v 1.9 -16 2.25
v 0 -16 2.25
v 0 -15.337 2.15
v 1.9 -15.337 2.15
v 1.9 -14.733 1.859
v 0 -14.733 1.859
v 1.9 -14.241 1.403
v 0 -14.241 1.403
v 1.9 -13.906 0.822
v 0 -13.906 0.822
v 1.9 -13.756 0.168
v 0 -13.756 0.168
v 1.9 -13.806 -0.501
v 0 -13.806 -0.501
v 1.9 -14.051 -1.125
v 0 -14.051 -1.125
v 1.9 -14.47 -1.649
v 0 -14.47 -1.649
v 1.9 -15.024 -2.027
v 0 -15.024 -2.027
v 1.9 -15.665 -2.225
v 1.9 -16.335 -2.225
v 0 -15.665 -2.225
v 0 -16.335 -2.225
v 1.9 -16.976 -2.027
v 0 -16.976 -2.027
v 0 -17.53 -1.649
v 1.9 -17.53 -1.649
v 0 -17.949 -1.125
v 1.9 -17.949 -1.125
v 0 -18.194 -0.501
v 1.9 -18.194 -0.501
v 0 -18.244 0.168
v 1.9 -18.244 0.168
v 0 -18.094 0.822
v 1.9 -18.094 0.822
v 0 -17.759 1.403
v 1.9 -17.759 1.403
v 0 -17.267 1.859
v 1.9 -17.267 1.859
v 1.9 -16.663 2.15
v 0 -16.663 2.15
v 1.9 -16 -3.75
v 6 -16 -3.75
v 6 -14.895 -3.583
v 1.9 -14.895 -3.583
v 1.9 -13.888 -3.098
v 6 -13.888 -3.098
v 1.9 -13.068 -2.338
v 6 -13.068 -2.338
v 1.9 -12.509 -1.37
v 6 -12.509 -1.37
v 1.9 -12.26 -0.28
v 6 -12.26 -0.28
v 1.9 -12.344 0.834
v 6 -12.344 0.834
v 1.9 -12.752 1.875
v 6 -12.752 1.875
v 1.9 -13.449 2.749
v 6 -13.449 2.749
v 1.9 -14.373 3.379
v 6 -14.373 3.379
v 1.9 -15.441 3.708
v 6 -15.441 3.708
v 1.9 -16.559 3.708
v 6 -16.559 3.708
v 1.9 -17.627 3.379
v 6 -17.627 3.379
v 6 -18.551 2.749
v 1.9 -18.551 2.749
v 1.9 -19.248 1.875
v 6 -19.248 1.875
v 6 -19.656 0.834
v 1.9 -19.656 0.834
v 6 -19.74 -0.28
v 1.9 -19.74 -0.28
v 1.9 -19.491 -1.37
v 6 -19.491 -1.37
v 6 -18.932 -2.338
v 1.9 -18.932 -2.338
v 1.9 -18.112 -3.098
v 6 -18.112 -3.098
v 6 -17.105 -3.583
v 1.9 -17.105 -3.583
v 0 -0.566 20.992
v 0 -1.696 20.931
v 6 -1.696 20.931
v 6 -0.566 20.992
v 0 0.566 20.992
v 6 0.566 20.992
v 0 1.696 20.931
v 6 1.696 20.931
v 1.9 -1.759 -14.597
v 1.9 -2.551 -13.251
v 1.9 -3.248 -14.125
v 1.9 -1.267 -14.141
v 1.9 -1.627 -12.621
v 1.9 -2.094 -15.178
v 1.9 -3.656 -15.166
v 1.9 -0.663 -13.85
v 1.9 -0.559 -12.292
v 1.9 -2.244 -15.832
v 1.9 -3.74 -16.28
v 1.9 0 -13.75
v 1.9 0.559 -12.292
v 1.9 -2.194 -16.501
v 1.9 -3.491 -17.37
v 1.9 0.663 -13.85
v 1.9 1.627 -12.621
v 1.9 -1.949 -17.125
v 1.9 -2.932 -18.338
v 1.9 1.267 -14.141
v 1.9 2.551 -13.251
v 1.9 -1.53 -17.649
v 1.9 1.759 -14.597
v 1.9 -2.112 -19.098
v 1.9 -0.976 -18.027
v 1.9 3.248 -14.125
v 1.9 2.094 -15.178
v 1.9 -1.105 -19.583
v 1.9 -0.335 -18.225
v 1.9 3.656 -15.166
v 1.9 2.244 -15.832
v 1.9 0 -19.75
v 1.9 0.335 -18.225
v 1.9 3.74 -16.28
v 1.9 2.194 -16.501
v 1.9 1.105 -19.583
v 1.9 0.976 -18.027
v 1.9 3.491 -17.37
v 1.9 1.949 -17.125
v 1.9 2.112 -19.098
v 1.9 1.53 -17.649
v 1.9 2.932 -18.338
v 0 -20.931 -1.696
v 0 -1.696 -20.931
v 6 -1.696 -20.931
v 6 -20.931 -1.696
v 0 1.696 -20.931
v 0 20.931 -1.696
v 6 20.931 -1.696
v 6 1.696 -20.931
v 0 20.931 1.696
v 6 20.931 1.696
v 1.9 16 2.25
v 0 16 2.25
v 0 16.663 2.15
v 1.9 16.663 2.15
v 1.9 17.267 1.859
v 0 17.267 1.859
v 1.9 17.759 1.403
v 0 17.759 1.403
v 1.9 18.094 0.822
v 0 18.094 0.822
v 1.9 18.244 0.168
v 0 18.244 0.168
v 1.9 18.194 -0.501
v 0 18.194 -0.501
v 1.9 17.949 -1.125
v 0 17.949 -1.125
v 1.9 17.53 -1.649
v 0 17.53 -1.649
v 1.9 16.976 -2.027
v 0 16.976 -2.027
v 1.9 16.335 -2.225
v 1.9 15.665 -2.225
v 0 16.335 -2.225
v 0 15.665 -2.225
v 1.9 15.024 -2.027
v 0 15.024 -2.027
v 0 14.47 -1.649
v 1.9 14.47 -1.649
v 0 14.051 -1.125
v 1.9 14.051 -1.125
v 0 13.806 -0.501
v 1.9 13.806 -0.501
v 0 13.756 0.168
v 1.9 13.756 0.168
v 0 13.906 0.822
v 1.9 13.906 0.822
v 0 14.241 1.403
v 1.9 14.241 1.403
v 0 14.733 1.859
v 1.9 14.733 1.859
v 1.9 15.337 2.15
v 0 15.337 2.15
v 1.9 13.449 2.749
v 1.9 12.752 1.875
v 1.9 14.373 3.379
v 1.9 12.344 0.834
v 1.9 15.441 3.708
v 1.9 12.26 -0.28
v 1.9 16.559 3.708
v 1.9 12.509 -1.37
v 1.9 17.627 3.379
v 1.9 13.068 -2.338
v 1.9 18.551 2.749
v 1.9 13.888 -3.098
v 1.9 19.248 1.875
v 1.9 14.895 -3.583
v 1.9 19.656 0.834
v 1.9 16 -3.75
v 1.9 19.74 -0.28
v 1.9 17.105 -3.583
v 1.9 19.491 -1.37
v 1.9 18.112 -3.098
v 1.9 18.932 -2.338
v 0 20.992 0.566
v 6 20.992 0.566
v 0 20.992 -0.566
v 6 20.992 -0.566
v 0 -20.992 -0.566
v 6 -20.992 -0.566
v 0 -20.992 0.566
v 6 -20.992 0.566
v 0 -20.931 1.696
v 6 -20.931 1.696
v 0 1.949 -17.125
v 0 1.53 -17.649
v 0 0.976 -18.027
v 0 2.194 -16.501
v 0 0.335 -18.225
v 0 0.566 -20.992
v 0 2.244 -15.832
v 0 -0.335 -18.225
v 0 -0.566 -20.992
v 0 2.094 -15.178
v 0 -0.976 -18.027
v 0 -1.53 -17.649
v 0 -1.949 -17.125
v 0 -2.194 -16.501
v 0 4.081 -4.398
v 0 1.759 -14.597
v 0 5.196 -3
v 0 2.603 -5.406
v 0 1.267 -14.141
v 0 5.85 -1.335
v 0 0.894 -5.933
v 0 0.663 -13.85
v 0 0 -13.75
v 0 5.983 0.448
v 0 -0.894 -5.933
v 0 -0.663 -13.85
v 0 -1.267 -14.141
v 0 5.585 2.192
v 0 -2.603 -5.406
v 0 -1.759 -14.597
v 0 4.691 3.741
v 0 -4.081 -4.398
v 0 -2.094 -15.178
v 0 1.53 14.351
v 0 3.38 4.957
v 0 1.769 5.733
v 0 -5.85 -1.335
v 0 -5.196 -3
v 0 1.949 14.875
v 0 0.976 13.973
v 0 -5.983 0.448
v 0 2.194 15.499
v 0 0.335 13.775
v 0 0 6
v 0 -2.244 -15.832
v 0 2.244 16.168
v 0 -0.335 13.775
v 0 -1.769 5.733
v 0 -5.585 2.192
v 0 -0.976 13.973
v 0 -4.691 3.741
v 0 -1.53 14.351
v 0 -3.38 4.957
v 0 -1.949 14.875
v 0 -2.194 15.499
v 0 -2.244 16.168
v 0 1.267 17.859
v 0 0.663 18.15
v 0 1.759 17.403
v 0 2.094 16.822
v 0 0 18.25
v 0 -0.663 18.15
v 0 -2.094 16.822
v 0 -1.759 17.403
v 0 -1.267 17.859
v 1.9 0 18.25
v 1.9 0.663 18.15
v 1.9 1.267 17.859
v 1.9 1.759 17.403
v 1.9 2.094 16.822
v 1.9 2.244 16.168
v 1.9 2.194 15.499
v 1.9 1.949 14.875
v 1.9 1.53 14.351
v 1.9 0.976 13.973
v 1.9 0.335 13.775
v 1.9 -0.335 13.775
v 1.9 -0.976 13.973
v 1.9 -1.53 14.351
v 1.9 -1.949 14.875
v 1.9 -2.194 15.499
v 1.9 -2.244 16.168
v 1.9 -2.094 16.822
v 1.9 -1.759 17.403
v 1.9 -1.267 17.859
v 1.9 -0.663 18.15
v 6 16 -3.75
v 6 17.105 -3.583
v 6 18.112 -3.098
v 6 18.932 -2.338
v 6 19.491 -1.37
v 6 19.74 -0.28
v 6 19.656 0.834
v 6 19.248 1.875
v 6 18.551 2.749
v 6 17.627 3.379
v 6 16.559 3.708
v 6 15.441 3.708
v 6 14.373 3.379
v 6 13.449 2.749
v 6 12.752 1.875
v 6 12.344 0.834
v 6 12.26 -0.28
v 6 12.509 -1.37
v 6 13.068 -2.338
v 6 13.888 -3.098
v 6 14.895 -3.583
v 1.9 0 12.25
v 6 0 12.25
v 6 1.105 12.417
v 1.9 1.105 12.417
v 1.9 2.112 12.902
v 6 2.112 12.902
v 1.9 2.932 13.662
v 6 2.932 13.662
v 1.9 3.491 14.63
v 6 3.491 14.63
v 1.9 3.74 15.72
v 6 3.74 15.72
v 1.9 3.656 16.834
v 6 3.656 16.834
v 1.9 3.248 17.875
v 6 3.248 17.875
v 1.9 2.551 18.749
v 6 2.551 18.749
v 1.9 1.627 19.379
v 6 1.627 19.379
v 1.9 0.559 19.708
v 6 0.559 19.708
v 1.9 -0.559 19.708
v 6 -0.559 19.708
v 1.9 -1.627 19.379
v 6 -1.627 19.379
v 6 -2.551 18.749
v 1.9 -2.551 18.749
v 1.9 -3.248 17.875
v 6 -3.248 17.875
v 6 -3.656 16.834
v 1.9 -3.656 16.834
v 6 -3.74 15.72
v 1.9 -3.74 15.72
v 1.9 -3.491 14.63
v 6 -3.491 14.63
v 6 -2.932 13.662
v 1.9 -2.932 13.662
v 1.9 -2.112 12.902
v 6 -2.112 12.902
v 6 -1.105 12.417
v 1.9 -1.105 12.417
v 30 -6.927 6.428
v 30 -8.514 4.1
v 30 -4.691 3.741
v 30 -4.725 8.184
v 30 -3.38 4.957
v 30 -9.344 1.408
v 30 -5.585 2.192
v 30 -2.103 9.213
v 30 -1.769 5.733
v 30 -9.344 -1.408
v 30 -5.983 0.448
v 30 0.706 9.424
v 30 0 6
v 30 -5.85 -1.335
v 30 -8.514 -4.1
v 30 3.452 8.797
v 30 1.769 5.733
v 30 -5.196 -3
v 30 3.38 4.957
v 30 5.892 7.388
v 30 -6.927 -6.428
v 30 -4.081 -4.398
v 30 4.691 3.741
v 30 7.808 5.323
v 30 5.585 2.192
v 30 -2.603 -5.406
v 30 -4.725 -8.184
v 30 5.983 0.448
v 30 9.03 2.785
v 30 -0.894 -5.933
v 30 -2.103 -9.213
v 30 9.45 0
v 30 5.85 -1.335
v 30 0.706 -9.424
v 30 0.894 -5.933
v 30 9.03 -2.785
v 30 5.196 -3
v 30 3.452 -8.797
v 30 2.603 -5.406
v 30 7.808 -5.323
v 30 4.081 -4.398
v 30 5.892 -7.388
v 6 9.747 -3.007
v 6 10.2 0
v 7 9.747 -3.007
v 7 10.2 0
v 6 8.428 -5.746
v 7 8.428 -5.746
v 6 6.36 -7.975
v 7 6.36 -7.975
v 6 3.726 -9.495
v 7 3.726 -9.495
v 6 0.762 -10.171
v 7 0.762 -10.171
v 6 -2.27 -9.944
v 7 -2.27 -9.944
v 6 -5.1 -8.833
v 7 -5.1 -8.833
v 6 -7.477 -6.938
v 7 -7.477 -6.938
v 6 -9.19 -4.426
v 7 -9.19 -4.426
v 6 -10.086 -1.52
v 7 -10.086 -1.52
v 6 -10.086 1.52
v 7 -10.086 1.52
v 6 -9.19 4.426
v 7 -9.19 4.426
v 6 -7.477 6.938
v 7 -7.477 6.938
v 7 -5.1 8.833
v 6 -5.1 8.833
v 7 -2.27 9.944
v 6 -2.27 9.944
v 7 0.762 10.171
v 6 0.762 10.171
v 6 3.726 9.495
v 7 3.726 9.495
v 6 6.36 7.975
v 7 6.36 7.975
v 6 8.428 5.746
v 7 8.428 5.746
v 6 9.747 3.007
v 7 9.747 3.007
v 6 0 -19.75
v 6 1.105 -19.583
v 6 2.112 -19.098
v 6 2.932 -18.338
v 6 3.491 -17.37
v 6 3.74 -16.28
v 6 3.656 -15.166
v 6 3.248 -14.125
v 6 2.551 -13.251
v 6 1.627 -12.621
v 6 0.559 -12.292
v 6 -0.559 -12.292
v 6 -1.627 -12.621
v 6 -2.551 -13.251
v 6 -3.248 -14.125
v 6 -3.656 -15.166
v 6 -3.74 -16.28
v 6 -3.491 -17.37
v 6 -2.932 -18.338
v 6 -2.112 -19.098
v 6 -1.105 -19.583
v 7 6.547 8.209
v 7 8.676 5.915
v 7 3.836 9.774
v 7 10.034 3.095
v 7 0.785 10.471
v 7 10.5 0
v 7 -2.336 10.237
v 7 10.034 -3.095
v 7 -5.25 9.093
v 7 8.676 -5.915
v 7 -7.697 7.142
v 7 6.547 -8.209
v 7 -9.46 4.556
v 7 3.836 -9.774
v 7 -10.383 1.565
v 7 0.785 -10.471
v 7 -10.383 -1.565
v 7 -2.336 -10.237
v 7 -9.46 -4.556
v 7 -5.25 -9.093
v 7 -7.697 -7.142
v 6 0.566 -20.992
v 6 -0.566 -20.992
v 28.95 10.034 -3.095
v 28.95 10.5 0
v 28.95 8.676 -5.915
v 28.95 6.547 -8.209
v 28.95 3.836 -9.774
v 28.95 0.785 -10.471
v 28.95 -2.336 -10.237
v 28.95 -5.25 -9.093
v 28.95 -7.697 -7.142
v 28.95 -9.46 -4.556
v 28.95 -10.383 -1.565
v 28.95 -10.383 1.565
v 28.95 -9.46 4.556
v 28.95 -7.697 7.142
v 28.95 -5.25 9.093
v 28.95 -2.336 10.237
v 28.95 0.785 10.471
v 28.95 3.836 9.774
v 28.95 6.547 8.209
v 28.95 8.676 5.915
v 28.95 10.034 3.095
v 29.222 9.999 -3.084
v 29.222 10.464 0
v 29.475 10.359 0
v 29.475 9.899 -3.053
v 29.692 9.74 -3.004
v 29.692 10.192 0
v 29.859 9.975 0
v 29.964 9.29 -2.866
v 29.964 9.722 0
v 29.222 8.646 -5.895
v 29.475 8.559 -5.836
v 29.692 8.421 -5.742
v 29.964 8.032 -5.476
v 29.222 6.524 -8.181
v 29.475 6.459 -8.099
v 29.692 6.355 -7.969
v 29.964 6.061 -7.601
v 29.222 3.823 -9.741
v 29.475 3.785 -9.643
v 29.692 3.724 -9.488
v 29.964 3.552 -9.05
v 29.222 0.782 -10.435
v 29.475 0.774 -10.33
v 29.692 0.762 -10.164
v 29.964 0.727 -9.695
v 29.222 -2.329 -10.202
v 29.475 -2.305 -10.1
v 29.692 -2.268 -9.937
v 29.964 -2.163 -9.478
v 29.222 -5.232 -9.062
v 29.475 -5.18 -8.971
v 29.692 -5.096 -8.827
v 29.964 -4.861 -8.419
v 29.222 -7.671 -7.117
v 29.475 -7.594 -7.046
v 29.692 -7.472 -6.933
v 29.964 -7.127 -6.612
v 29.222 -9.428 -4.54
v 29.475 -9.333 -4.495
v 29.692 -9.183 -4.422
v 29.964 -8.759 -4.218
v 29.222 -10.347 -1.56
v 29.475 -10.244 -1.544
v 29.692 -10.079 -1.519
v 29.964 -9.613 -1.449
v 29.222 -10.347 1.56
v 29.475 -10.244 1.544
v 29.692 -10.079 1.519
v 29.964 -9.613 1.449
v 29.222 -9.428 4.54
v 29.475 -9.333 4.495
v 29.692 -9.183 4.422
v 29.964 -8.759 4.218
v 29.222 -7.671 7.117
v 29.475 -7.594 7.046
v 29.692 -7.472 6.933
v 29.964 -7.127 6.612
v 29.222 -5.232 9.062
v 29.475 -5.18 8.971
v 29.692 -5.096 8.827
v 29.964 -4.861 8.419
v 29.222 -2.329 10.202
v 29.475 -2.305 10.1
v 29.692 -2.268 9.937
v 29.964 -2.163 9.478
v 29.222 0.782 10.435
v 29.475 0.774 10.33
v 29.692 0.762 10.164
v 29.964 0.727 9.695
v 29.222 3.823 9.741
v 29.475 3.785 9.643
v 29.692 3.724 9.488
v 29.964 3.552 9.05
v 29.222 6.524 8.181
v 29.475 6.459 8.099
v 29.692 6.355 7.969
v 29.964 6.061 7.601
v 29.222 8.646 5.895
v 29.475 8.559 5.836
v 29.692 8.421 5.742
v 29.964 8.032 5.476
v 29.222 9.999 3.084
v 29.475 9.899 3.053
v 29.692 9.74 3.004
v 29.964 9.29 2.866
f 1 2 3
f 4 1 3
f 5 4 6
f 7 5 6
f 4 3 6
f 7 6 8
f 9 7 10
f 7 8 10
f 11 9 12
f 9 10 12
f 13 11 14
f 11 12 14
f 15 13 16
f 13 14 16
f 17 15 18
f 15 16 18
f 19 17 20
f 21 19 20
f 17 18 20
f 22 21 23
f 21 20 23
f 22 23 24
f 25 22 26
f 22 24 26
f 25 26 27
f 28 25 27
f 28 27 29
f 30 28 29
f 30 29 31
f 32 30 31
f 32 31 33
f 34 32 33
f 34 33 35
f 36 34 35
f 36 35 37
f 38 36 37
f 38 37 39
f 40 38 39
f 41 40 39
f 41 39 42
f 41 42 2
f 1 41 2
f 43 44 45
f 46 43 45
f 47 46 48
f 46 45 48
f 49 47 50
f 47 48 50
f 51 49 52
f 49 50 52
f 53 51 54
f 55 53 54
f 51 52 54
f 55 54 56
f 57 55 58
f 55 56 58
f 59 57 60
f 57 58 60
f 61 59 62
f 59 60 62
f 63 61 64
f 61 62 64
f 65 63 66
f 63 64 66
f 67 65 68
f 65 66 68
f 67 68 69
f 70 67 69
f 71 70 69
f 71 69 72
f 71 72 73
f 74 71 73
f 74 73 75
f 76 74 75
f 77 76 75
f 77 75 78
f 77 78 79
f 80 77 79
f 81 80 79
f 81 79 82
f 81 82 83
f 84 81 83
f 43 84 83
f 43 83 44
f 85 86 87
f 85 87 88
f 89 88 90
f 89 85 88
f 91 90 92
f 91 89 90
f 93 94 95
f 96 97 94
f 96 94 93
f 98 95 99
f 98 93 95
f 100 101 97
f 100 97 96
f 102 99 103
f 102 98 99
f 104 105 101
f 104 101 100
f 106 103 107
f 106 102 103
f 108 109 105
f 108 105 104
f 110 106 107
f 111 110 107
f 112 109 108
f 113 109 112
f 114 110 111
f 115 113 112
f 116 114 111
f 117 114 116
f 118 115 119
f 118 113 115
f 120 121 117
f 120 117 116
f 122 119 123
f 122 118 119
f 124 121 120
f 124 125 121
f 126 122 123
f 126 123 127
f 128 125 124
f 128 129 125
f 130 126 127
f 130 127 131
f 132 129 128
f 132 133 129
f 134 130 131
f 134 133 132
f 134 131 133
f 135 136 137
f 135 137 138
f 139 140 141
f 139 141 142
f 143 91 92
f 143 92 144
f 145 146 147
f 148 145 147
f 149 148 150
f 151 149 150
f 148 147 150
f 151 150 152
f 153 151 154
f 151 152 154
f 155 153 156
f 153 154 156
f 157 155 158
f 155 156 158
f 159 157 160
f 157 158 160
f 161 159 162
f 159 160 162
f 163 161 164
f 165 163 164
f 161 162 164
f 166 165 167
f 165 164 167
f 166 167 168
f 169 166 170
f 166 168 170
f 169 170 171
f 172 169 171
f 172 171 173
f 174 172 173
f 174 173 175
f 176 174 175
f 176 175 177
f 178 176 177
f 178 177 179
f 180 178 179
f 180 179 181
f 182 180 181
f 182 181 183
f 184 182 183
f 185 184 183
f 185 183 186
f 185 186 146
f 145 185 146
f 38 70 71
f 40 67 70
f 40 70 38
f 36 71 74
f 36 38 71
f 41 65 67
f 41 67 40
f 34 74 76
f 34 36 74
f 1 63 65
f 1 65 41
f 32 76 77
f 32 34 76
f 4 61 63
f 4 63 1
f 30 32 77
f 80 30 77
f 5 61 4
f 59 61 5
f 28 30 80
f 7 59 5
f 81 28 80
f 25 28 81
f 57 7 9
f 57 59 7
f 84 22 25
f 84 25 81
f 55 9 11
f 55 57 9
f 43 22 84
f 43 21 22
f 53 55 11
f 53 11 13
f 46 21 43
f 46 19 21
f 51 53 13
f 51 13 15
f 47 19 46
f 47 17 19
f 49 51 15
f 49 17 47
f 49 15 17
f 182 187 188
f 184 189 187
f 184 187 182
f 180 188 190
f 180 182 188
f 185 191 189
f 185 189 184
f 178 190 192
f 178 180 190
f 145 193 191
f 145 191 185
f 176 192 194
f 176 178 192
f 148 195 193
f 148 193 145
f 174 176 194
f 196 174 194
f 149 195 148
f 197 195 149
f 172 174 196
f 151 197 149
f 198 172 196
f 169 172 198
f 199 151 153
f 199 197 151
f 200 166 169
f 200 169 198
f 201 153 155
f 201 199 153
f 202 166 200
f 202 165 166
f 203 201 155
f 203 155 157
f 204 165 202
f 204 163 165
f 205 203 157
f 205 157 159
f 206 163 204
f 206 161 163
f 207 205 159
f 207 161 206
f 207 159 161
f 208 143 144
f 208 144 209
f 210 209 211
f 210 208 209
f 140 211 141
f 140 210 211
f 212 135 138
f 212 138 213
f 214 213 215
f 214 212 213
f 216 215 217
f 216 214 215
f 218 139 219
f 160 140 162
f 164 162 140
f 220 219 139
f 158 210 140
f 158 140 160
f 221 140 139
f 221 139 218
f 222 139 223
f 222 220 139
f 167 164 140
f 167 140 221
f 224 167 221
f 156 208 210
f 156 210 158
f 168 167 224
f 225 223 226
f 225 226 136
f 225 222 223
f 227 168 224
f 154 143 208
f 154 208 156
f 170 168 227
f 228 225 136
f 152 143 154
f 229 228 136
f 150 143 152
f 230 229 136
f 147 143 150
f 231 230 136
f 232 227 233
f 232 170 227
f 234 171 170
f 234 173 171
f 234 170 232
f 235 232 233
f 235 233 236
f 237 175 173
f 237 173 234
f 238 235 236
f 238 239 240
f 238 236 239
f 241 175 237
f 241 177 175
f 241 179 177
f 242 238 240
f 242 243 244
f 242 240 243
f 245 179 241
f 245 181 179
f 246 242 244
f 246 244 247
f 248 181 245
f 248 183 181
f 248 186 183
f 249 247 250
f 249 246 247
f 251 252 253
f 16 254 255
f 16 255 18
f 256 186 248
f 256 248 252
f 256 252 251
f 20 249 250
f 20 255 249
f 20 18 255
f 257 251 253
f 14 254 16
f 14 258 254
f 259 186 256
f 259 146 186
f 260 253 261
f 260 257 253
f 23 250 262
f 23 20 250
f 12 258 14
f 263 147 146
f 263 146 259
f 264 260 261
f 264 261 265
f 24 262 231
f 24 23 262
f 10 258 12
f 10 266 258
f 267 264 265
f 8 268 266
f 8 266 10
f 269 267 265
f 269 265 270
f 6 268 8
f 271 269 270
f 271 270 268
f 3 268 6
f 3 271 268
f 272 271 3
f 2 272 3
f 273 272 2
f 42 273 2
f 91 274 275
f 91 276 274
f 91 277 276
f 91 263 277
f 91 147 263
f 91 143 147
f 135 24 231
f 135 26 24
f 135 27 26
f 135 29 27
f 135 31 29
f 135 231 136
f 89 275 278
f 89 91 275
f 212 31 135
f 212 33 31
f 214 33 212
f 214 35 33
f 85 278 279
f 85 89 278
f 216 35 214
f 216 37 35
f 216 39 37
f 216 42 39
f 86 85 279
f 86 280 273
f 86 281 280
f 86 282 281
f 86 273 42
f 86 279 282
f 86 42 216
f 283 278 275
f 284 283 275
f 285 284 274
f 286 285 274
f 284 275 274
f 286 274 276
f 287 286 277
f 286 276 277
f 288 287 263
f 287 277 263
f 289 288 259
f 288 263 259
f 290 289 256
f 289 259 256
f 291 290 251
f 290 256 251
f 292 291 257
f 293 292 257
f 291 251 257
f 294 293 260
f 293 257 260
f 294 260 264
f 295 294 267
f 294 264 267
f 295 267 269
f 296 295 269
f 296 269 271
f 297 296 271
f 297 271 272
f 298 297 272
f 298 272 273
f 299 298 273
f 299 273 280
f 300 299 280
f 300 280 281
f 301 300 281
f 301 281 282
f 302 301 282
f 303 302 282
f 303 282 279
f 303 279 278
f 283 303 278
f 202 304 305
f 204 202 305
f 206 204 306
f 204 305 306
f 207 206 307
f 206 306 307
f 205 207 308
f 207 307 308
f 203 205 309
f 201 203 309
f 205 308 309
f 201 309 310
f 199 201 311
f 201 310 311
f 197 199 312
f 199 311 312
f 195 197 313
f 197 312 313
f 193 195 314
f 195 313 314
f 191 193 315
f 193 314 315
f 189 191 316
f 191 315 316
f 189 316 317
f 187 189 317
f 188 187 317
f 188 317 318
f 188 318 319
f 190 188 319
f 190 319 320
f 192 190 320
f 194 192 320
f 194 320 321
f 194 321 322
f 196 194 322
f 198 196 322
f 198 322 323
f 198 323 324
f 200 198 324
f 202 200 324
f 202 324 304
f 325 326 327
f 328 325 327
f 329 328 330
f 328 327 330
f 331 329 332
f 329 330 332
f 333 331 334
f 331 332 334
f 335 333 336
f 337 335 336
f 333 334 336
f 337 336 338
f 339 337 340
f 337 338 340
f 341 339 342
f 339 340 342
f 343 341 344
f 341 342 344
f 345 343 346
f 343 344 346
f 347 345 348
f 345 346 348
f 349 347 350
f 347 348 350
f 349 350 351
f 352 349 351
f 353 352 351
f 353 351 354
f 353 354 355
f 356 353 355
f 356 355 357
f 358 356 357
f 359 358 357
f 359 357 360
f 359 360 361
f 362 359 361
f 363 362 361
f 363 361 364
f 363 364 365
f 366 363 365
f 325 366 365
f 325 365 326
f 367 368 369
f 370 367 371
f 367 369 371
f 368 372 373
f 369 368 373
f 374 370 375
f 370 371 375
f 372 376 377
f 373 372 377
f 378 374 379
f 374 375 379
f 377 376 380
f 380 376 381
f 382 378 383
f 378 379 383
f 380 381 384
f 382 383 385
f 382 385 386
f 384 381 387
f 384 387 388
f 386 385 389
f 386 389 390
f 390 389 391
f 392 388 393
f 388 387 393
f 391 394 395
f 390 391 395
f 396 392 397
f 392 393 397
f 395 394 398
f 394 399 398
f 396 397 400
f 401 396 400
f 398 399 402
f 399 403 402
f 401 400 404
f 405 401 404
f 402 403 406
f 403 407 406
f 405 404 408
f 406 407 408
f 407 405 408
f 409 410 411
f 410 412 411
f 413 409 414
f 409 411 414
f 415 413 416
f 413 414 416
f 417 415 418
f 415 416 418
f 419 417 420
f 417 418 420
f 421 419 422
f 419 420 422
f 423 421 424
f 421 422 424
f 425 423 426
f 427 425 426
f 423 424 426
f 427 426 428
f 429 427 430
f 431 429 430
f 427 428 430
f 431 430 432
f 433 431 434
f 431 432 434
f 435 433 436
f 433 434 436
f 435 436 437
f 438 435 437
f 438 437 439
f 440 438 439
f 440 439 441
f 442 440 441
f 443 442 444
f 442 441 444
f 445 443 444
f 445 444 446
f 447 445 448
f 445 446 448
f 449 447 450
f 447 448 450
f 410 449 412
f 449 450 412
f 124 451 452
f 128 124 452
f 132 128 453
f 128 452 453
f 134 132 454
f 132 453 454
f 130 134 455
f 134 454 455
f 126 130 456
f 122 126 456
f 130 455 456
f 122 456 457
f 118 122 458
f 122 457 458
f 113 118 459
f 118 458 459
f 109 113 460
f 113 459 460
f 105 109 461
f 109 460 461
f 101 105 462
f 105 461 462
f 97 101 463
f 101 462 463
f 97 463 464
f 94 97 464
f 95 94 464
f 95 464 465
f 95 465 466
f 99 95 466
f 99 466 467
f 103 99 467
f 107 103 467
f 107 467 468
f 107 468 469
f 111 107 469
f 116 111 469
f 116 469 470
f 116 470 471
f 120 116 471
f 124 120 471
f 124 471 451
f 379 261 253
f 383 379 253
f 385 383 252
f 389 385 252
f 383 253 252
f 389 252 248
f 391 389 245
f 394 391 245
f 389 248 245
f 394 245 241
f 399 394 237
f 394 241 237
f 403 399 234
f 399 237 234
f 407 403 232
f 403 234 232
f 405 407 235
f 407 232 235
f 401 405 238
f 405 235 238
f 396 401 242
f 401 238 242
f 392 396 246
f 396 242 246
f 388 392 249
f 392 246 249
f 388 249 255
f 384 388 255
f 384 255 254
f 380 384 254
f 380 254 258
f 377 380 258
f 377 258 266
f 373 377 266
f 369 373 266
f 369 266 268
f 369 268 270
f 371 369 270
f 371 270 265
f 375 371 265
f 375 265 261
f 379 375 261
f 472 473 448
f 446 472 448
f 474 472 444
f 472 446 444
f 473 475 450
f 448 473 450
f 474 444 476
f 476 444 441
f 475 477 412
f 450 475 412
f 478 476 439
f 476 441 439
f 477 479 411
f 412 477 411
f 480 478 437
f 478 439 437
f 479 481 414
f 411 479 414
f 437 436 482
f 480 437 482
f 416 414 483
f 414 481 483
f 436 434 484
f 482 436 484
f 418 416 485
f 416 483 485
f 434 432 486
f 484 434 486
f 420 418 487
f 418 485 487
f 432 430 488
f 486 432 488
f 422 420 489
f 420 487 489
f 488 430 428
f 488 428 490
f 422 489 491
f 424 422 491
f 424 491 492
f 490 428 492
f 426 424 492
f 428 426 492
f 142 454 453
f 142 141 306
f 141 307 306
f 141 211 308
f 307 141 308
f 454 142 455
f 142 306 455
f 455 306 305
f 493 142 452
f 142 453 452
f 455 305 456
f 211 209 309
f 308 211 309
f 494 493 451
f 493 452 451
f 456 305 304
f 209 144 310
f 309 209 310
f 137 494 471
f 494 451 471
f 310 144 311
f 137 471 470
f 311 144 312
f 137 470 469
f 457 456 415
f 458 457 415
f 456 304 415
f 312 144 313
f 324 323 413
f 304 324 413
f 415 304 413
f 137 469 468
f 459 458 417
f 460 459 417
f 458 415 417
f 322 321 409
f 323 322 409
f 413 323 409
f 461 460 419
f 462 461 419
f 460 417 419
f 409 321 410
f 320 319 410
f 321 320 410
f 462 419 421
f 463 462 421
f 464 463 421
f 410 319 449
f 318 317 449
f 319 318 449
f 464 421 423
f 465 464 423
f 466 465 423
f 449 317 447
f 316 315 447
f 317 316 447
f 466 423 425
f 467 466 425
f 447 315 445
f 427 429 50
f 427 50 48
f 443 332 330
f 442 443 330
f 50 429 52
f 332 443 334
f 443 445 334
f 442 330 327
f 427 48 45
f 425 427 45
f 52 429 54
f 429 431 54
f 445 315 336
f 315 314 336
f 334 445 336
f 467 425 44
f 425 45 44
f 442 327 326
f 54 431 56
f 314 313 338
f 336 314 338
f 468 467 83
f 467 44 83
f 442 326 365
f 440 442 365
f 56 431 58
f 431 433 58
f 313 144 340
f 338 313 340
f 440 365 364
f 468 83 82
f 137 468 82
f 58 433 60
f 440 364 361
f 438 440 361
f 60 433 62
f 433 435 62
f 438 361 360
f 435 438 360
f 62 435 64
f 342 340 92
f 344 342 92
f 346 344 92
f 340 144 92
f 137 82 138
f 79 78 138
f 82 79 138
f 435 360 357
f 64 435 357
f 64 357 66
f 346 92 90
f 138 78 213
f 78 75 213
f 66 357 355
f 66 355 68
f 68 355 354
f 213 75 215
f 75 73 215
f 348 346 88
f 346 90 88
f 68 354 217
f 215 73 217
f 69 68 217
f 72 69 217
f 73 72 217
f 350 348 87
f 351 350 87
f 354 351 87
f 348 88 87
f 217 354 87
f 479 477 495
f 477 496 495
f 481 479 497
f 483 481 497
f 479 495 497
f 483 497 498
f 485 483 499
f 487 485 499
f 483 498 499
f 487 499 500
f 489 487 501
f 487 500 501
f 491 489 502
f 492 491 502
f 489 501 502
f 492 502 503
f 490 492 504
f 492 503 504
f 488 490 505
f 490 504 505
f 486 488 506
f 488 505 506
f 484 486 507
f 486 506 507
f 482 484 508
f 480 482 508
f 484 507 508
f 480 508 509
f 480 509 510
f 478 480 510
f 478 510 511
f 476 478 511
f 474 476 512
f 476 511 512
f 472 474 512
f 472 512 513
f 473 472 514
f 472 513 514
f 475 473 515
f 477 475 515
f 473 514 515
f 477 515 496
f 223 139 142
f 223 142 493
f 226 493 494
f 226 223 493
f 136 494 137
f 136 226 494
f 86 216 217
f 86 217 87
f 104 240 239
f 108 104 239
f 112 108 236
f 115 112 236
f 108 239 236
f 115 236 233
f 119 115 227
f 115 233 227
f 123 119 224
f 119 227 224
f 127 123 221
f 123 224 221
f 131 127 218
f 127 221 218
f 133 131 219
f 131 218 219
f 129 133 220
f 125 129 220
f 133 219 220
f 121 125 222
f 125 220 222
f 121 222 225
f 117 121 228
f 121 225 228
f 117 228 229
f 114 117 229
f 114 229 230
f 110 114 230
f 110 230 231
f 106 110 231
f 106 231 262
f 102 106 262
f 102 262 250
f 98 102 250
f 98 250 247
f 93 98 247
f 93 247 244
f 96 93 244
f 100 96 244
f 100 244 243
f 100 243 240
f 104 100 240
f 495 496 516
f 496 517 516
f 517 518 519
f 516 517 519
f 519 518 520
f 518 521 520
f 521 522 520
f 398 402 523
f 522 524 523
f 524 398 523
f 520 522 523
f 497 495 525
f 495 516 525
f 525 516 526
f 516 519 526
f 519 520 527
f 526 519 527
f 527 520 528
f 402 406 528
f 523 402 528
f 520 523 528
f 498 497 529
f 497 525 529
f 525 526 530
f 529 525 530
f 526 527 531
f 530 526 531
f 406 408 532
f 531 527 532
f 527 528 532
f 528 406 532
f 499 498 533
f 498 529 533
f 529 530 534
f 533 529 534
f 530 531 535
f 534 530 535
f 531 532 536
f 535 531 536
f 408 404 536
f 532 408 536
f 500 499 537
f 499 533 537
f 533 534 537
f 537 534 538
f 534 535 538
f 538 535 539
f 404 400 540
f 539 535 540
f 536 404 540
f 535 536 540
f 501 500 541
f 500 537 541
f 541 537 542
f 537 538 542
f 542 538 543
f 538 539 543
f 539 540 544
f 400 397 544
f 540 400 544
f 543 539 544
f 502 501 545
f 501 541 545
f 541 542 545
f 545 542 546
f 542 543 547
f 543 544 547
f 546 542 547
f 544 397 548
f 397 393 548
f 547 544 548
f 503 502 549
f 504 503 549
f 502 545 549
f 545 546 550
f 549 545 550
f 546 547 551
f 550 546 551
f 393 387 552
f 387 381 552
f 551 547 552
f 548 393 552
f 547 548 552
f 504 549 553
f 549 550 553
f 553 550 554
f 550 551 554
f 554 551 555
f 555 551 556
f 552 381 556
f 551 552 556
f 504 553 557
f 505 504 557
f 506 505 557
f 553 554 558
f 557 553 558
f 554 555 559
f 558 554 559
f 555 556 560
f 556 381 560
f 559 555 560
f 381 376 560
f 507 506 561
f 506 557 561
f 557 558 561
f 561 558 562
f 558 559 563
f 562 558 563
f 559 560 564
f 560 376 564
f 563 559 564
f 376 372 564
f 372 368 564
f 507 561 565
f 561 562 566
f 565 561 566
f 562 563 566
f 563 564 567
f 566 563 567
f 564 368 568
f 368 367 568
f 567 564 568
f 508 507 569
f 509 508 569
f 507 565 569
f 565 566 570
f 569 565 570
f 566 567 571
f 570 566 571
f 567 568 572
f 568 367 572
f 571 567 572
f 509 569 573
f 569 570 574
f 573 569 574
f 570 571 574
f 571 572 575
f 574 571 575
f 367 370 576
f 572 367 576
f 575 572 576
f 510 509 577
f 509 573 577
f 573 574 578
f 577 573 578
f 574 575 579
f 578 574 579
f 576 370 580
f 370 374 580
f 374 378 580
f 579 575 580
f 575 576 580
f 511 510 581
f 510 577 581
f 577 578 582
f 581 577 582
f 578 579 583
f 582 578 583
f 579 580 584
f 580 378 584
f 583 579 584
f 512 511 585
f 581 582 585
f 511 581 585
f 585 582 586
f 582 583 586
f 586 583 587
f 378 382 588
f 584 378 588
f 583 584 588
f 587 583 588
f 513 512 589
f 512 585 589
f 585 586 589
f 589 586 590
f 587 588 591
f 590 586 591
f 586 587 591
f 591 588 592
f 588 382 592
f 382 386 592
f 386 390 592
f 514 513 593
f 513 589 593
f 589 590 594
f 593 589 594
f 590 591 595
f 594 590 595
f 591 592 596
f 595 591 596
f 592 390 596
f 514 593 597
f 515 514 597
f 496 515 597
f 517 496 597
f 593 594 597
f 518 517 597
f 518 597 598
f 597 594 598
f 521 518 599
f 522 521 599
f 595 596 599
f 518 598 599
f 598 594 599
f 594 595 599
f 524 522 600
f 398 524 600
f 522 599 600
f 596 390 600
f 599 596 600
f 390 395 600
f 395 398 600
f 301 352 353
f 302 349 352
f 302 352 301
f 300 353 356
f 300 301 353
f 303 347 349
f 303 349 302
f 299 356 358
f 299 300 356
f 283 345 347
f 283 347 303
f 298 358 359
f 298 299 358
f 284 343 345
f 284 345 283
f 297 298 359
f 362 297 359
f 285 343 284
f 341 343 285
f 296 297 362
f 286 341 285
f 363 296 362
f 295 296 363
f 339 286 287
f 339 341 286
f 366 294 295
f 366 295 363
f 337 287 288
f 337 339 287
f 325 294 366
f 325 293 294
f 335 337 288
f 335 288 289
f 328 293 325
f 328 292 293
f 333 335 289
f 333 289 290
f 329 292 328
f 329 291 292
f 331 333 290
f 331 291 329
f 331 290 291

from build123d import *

# Parameters (mm, degrees)
BOSS_EXTRUDE1_DEPTH                              = 6
CBORE_FOR_M4_HEX_HEAD_MACHINE_SCREW1_D           = 4.5
CBORE_FOR_M4_HEX_HEAD_MACHINE_SCREW1_DEPTH       = 6
CBORE_FOR_M4_HEX_HEAD_MACHINE_SCREW1_CBORE_D     = 7.5
CBORE_FOR_M4_HEX_HEAD_MACHINE_SCREW1_CBORE_DEPTH = 4.1
F_12_0_12_DIAMETER_HOLE1_D                       = 12
F_12_0_12_DIAMETER_HOLE1_DEPTH                   = 30


with BuildPart() as part:
    # Sketch1 → Boss-Extrude1 (new body)
    with BuildSketch(Plane(origin=(0, 0, 0), x_dir=(0, -1, 0), z_dir=(-1, 0, 0))):
        with BuildLine():
            Line((-1.696016468, 20.93140053), (-20.93140053, 1.696016468))
            ThreePointArc((-20.93140053, 1.696016468), (-21, 0), (-20.93140053, -1.696016468))
            Line((-20.93140053, -1.696016468), (-1.696016468, -20.93140053))
            ThreePointArc((-1.696016468, -20.93140053), (0, -21), (1.696016468, -20.93140053))
            Line((1.696016468, -20.93140053), (20.93140053, -1.696016468))
            ThreePointArc((20.93140053, -1.696016468), (21, 0), (20.93140053, 1.696016468))
            Line((20.93140053, 1.696016468), (1.696016468, 20.93140053))
            ThreePointArc((1.696016468, 20.93140053), (0, 21), (-1.696016468, 20.93140053))
        make_face()
    extrude(amount=-BOSS_EXTRUDE1_DEPTH)

    # Sketch2 → Revolve1 (revolve)
    with BuildSketch(Plane(origin=(0, 0, 0), x_dir=(-1, 0, 0), z_dir=(0, 0, -1))):
        with BuildLine():
            Line((-30, 9.45), (-30, 0))
            Line((-30, 0), (-6, 0))
            Line((-6, 0), (-6, 10.2))
            Line((-6, 10.2), (-7, 10.2))
            Line((-7, 10.2), (-7, 10.5))
            Line((-7, 10.5), (-28.95, 10.5))
            ThreePointArc((-28.95, 10.5), (-29.69246212, 10.19246212), (-30, 9.45))
        make_face()
    revolve(axis=Axis((30.00125, 0, 0), (-1, 0, 0)))

    # CBORE for M4 Hex Head Machine Screw1
    with Locations(Plane(origin=(6, 0, 0), x_dir=(0, 0, -1), z_dir=(1, 0, 0))):
        with Locations((0, -16), (16, 0), (-16, 0), (0, 16)):
            CounterBoreHole(CBORE_FOR_M4_HEX_HEAD_MACHINE_SCREW1_D / 2, CBORE_FOR_M4_HEX_HEAD_MACHINE_SCREW1_CBORE_D / 2, CBORE_FOR_M4_HEX_HEAD_MACHINE_SCREW1_CBORE_DEPTH, depth=CBORE_FOR_M4_HEX_HEAD_MACHINE_SCREW1_DEPTH)

    # Ø12.0 (12) Diameter Hole1
    with Locations(Plane(origin=(30, 0, 0), x_dir=(0, 0, -1), z_dir=(1, 0, 0))):
        with Locations((0, 0)):
            Hole(F_12_0_12_DIAMETER_HOLE1_D / 2, depth=F_12_0_12_DIAMETER_HOLE1_DEPTH)


solid = part.part
